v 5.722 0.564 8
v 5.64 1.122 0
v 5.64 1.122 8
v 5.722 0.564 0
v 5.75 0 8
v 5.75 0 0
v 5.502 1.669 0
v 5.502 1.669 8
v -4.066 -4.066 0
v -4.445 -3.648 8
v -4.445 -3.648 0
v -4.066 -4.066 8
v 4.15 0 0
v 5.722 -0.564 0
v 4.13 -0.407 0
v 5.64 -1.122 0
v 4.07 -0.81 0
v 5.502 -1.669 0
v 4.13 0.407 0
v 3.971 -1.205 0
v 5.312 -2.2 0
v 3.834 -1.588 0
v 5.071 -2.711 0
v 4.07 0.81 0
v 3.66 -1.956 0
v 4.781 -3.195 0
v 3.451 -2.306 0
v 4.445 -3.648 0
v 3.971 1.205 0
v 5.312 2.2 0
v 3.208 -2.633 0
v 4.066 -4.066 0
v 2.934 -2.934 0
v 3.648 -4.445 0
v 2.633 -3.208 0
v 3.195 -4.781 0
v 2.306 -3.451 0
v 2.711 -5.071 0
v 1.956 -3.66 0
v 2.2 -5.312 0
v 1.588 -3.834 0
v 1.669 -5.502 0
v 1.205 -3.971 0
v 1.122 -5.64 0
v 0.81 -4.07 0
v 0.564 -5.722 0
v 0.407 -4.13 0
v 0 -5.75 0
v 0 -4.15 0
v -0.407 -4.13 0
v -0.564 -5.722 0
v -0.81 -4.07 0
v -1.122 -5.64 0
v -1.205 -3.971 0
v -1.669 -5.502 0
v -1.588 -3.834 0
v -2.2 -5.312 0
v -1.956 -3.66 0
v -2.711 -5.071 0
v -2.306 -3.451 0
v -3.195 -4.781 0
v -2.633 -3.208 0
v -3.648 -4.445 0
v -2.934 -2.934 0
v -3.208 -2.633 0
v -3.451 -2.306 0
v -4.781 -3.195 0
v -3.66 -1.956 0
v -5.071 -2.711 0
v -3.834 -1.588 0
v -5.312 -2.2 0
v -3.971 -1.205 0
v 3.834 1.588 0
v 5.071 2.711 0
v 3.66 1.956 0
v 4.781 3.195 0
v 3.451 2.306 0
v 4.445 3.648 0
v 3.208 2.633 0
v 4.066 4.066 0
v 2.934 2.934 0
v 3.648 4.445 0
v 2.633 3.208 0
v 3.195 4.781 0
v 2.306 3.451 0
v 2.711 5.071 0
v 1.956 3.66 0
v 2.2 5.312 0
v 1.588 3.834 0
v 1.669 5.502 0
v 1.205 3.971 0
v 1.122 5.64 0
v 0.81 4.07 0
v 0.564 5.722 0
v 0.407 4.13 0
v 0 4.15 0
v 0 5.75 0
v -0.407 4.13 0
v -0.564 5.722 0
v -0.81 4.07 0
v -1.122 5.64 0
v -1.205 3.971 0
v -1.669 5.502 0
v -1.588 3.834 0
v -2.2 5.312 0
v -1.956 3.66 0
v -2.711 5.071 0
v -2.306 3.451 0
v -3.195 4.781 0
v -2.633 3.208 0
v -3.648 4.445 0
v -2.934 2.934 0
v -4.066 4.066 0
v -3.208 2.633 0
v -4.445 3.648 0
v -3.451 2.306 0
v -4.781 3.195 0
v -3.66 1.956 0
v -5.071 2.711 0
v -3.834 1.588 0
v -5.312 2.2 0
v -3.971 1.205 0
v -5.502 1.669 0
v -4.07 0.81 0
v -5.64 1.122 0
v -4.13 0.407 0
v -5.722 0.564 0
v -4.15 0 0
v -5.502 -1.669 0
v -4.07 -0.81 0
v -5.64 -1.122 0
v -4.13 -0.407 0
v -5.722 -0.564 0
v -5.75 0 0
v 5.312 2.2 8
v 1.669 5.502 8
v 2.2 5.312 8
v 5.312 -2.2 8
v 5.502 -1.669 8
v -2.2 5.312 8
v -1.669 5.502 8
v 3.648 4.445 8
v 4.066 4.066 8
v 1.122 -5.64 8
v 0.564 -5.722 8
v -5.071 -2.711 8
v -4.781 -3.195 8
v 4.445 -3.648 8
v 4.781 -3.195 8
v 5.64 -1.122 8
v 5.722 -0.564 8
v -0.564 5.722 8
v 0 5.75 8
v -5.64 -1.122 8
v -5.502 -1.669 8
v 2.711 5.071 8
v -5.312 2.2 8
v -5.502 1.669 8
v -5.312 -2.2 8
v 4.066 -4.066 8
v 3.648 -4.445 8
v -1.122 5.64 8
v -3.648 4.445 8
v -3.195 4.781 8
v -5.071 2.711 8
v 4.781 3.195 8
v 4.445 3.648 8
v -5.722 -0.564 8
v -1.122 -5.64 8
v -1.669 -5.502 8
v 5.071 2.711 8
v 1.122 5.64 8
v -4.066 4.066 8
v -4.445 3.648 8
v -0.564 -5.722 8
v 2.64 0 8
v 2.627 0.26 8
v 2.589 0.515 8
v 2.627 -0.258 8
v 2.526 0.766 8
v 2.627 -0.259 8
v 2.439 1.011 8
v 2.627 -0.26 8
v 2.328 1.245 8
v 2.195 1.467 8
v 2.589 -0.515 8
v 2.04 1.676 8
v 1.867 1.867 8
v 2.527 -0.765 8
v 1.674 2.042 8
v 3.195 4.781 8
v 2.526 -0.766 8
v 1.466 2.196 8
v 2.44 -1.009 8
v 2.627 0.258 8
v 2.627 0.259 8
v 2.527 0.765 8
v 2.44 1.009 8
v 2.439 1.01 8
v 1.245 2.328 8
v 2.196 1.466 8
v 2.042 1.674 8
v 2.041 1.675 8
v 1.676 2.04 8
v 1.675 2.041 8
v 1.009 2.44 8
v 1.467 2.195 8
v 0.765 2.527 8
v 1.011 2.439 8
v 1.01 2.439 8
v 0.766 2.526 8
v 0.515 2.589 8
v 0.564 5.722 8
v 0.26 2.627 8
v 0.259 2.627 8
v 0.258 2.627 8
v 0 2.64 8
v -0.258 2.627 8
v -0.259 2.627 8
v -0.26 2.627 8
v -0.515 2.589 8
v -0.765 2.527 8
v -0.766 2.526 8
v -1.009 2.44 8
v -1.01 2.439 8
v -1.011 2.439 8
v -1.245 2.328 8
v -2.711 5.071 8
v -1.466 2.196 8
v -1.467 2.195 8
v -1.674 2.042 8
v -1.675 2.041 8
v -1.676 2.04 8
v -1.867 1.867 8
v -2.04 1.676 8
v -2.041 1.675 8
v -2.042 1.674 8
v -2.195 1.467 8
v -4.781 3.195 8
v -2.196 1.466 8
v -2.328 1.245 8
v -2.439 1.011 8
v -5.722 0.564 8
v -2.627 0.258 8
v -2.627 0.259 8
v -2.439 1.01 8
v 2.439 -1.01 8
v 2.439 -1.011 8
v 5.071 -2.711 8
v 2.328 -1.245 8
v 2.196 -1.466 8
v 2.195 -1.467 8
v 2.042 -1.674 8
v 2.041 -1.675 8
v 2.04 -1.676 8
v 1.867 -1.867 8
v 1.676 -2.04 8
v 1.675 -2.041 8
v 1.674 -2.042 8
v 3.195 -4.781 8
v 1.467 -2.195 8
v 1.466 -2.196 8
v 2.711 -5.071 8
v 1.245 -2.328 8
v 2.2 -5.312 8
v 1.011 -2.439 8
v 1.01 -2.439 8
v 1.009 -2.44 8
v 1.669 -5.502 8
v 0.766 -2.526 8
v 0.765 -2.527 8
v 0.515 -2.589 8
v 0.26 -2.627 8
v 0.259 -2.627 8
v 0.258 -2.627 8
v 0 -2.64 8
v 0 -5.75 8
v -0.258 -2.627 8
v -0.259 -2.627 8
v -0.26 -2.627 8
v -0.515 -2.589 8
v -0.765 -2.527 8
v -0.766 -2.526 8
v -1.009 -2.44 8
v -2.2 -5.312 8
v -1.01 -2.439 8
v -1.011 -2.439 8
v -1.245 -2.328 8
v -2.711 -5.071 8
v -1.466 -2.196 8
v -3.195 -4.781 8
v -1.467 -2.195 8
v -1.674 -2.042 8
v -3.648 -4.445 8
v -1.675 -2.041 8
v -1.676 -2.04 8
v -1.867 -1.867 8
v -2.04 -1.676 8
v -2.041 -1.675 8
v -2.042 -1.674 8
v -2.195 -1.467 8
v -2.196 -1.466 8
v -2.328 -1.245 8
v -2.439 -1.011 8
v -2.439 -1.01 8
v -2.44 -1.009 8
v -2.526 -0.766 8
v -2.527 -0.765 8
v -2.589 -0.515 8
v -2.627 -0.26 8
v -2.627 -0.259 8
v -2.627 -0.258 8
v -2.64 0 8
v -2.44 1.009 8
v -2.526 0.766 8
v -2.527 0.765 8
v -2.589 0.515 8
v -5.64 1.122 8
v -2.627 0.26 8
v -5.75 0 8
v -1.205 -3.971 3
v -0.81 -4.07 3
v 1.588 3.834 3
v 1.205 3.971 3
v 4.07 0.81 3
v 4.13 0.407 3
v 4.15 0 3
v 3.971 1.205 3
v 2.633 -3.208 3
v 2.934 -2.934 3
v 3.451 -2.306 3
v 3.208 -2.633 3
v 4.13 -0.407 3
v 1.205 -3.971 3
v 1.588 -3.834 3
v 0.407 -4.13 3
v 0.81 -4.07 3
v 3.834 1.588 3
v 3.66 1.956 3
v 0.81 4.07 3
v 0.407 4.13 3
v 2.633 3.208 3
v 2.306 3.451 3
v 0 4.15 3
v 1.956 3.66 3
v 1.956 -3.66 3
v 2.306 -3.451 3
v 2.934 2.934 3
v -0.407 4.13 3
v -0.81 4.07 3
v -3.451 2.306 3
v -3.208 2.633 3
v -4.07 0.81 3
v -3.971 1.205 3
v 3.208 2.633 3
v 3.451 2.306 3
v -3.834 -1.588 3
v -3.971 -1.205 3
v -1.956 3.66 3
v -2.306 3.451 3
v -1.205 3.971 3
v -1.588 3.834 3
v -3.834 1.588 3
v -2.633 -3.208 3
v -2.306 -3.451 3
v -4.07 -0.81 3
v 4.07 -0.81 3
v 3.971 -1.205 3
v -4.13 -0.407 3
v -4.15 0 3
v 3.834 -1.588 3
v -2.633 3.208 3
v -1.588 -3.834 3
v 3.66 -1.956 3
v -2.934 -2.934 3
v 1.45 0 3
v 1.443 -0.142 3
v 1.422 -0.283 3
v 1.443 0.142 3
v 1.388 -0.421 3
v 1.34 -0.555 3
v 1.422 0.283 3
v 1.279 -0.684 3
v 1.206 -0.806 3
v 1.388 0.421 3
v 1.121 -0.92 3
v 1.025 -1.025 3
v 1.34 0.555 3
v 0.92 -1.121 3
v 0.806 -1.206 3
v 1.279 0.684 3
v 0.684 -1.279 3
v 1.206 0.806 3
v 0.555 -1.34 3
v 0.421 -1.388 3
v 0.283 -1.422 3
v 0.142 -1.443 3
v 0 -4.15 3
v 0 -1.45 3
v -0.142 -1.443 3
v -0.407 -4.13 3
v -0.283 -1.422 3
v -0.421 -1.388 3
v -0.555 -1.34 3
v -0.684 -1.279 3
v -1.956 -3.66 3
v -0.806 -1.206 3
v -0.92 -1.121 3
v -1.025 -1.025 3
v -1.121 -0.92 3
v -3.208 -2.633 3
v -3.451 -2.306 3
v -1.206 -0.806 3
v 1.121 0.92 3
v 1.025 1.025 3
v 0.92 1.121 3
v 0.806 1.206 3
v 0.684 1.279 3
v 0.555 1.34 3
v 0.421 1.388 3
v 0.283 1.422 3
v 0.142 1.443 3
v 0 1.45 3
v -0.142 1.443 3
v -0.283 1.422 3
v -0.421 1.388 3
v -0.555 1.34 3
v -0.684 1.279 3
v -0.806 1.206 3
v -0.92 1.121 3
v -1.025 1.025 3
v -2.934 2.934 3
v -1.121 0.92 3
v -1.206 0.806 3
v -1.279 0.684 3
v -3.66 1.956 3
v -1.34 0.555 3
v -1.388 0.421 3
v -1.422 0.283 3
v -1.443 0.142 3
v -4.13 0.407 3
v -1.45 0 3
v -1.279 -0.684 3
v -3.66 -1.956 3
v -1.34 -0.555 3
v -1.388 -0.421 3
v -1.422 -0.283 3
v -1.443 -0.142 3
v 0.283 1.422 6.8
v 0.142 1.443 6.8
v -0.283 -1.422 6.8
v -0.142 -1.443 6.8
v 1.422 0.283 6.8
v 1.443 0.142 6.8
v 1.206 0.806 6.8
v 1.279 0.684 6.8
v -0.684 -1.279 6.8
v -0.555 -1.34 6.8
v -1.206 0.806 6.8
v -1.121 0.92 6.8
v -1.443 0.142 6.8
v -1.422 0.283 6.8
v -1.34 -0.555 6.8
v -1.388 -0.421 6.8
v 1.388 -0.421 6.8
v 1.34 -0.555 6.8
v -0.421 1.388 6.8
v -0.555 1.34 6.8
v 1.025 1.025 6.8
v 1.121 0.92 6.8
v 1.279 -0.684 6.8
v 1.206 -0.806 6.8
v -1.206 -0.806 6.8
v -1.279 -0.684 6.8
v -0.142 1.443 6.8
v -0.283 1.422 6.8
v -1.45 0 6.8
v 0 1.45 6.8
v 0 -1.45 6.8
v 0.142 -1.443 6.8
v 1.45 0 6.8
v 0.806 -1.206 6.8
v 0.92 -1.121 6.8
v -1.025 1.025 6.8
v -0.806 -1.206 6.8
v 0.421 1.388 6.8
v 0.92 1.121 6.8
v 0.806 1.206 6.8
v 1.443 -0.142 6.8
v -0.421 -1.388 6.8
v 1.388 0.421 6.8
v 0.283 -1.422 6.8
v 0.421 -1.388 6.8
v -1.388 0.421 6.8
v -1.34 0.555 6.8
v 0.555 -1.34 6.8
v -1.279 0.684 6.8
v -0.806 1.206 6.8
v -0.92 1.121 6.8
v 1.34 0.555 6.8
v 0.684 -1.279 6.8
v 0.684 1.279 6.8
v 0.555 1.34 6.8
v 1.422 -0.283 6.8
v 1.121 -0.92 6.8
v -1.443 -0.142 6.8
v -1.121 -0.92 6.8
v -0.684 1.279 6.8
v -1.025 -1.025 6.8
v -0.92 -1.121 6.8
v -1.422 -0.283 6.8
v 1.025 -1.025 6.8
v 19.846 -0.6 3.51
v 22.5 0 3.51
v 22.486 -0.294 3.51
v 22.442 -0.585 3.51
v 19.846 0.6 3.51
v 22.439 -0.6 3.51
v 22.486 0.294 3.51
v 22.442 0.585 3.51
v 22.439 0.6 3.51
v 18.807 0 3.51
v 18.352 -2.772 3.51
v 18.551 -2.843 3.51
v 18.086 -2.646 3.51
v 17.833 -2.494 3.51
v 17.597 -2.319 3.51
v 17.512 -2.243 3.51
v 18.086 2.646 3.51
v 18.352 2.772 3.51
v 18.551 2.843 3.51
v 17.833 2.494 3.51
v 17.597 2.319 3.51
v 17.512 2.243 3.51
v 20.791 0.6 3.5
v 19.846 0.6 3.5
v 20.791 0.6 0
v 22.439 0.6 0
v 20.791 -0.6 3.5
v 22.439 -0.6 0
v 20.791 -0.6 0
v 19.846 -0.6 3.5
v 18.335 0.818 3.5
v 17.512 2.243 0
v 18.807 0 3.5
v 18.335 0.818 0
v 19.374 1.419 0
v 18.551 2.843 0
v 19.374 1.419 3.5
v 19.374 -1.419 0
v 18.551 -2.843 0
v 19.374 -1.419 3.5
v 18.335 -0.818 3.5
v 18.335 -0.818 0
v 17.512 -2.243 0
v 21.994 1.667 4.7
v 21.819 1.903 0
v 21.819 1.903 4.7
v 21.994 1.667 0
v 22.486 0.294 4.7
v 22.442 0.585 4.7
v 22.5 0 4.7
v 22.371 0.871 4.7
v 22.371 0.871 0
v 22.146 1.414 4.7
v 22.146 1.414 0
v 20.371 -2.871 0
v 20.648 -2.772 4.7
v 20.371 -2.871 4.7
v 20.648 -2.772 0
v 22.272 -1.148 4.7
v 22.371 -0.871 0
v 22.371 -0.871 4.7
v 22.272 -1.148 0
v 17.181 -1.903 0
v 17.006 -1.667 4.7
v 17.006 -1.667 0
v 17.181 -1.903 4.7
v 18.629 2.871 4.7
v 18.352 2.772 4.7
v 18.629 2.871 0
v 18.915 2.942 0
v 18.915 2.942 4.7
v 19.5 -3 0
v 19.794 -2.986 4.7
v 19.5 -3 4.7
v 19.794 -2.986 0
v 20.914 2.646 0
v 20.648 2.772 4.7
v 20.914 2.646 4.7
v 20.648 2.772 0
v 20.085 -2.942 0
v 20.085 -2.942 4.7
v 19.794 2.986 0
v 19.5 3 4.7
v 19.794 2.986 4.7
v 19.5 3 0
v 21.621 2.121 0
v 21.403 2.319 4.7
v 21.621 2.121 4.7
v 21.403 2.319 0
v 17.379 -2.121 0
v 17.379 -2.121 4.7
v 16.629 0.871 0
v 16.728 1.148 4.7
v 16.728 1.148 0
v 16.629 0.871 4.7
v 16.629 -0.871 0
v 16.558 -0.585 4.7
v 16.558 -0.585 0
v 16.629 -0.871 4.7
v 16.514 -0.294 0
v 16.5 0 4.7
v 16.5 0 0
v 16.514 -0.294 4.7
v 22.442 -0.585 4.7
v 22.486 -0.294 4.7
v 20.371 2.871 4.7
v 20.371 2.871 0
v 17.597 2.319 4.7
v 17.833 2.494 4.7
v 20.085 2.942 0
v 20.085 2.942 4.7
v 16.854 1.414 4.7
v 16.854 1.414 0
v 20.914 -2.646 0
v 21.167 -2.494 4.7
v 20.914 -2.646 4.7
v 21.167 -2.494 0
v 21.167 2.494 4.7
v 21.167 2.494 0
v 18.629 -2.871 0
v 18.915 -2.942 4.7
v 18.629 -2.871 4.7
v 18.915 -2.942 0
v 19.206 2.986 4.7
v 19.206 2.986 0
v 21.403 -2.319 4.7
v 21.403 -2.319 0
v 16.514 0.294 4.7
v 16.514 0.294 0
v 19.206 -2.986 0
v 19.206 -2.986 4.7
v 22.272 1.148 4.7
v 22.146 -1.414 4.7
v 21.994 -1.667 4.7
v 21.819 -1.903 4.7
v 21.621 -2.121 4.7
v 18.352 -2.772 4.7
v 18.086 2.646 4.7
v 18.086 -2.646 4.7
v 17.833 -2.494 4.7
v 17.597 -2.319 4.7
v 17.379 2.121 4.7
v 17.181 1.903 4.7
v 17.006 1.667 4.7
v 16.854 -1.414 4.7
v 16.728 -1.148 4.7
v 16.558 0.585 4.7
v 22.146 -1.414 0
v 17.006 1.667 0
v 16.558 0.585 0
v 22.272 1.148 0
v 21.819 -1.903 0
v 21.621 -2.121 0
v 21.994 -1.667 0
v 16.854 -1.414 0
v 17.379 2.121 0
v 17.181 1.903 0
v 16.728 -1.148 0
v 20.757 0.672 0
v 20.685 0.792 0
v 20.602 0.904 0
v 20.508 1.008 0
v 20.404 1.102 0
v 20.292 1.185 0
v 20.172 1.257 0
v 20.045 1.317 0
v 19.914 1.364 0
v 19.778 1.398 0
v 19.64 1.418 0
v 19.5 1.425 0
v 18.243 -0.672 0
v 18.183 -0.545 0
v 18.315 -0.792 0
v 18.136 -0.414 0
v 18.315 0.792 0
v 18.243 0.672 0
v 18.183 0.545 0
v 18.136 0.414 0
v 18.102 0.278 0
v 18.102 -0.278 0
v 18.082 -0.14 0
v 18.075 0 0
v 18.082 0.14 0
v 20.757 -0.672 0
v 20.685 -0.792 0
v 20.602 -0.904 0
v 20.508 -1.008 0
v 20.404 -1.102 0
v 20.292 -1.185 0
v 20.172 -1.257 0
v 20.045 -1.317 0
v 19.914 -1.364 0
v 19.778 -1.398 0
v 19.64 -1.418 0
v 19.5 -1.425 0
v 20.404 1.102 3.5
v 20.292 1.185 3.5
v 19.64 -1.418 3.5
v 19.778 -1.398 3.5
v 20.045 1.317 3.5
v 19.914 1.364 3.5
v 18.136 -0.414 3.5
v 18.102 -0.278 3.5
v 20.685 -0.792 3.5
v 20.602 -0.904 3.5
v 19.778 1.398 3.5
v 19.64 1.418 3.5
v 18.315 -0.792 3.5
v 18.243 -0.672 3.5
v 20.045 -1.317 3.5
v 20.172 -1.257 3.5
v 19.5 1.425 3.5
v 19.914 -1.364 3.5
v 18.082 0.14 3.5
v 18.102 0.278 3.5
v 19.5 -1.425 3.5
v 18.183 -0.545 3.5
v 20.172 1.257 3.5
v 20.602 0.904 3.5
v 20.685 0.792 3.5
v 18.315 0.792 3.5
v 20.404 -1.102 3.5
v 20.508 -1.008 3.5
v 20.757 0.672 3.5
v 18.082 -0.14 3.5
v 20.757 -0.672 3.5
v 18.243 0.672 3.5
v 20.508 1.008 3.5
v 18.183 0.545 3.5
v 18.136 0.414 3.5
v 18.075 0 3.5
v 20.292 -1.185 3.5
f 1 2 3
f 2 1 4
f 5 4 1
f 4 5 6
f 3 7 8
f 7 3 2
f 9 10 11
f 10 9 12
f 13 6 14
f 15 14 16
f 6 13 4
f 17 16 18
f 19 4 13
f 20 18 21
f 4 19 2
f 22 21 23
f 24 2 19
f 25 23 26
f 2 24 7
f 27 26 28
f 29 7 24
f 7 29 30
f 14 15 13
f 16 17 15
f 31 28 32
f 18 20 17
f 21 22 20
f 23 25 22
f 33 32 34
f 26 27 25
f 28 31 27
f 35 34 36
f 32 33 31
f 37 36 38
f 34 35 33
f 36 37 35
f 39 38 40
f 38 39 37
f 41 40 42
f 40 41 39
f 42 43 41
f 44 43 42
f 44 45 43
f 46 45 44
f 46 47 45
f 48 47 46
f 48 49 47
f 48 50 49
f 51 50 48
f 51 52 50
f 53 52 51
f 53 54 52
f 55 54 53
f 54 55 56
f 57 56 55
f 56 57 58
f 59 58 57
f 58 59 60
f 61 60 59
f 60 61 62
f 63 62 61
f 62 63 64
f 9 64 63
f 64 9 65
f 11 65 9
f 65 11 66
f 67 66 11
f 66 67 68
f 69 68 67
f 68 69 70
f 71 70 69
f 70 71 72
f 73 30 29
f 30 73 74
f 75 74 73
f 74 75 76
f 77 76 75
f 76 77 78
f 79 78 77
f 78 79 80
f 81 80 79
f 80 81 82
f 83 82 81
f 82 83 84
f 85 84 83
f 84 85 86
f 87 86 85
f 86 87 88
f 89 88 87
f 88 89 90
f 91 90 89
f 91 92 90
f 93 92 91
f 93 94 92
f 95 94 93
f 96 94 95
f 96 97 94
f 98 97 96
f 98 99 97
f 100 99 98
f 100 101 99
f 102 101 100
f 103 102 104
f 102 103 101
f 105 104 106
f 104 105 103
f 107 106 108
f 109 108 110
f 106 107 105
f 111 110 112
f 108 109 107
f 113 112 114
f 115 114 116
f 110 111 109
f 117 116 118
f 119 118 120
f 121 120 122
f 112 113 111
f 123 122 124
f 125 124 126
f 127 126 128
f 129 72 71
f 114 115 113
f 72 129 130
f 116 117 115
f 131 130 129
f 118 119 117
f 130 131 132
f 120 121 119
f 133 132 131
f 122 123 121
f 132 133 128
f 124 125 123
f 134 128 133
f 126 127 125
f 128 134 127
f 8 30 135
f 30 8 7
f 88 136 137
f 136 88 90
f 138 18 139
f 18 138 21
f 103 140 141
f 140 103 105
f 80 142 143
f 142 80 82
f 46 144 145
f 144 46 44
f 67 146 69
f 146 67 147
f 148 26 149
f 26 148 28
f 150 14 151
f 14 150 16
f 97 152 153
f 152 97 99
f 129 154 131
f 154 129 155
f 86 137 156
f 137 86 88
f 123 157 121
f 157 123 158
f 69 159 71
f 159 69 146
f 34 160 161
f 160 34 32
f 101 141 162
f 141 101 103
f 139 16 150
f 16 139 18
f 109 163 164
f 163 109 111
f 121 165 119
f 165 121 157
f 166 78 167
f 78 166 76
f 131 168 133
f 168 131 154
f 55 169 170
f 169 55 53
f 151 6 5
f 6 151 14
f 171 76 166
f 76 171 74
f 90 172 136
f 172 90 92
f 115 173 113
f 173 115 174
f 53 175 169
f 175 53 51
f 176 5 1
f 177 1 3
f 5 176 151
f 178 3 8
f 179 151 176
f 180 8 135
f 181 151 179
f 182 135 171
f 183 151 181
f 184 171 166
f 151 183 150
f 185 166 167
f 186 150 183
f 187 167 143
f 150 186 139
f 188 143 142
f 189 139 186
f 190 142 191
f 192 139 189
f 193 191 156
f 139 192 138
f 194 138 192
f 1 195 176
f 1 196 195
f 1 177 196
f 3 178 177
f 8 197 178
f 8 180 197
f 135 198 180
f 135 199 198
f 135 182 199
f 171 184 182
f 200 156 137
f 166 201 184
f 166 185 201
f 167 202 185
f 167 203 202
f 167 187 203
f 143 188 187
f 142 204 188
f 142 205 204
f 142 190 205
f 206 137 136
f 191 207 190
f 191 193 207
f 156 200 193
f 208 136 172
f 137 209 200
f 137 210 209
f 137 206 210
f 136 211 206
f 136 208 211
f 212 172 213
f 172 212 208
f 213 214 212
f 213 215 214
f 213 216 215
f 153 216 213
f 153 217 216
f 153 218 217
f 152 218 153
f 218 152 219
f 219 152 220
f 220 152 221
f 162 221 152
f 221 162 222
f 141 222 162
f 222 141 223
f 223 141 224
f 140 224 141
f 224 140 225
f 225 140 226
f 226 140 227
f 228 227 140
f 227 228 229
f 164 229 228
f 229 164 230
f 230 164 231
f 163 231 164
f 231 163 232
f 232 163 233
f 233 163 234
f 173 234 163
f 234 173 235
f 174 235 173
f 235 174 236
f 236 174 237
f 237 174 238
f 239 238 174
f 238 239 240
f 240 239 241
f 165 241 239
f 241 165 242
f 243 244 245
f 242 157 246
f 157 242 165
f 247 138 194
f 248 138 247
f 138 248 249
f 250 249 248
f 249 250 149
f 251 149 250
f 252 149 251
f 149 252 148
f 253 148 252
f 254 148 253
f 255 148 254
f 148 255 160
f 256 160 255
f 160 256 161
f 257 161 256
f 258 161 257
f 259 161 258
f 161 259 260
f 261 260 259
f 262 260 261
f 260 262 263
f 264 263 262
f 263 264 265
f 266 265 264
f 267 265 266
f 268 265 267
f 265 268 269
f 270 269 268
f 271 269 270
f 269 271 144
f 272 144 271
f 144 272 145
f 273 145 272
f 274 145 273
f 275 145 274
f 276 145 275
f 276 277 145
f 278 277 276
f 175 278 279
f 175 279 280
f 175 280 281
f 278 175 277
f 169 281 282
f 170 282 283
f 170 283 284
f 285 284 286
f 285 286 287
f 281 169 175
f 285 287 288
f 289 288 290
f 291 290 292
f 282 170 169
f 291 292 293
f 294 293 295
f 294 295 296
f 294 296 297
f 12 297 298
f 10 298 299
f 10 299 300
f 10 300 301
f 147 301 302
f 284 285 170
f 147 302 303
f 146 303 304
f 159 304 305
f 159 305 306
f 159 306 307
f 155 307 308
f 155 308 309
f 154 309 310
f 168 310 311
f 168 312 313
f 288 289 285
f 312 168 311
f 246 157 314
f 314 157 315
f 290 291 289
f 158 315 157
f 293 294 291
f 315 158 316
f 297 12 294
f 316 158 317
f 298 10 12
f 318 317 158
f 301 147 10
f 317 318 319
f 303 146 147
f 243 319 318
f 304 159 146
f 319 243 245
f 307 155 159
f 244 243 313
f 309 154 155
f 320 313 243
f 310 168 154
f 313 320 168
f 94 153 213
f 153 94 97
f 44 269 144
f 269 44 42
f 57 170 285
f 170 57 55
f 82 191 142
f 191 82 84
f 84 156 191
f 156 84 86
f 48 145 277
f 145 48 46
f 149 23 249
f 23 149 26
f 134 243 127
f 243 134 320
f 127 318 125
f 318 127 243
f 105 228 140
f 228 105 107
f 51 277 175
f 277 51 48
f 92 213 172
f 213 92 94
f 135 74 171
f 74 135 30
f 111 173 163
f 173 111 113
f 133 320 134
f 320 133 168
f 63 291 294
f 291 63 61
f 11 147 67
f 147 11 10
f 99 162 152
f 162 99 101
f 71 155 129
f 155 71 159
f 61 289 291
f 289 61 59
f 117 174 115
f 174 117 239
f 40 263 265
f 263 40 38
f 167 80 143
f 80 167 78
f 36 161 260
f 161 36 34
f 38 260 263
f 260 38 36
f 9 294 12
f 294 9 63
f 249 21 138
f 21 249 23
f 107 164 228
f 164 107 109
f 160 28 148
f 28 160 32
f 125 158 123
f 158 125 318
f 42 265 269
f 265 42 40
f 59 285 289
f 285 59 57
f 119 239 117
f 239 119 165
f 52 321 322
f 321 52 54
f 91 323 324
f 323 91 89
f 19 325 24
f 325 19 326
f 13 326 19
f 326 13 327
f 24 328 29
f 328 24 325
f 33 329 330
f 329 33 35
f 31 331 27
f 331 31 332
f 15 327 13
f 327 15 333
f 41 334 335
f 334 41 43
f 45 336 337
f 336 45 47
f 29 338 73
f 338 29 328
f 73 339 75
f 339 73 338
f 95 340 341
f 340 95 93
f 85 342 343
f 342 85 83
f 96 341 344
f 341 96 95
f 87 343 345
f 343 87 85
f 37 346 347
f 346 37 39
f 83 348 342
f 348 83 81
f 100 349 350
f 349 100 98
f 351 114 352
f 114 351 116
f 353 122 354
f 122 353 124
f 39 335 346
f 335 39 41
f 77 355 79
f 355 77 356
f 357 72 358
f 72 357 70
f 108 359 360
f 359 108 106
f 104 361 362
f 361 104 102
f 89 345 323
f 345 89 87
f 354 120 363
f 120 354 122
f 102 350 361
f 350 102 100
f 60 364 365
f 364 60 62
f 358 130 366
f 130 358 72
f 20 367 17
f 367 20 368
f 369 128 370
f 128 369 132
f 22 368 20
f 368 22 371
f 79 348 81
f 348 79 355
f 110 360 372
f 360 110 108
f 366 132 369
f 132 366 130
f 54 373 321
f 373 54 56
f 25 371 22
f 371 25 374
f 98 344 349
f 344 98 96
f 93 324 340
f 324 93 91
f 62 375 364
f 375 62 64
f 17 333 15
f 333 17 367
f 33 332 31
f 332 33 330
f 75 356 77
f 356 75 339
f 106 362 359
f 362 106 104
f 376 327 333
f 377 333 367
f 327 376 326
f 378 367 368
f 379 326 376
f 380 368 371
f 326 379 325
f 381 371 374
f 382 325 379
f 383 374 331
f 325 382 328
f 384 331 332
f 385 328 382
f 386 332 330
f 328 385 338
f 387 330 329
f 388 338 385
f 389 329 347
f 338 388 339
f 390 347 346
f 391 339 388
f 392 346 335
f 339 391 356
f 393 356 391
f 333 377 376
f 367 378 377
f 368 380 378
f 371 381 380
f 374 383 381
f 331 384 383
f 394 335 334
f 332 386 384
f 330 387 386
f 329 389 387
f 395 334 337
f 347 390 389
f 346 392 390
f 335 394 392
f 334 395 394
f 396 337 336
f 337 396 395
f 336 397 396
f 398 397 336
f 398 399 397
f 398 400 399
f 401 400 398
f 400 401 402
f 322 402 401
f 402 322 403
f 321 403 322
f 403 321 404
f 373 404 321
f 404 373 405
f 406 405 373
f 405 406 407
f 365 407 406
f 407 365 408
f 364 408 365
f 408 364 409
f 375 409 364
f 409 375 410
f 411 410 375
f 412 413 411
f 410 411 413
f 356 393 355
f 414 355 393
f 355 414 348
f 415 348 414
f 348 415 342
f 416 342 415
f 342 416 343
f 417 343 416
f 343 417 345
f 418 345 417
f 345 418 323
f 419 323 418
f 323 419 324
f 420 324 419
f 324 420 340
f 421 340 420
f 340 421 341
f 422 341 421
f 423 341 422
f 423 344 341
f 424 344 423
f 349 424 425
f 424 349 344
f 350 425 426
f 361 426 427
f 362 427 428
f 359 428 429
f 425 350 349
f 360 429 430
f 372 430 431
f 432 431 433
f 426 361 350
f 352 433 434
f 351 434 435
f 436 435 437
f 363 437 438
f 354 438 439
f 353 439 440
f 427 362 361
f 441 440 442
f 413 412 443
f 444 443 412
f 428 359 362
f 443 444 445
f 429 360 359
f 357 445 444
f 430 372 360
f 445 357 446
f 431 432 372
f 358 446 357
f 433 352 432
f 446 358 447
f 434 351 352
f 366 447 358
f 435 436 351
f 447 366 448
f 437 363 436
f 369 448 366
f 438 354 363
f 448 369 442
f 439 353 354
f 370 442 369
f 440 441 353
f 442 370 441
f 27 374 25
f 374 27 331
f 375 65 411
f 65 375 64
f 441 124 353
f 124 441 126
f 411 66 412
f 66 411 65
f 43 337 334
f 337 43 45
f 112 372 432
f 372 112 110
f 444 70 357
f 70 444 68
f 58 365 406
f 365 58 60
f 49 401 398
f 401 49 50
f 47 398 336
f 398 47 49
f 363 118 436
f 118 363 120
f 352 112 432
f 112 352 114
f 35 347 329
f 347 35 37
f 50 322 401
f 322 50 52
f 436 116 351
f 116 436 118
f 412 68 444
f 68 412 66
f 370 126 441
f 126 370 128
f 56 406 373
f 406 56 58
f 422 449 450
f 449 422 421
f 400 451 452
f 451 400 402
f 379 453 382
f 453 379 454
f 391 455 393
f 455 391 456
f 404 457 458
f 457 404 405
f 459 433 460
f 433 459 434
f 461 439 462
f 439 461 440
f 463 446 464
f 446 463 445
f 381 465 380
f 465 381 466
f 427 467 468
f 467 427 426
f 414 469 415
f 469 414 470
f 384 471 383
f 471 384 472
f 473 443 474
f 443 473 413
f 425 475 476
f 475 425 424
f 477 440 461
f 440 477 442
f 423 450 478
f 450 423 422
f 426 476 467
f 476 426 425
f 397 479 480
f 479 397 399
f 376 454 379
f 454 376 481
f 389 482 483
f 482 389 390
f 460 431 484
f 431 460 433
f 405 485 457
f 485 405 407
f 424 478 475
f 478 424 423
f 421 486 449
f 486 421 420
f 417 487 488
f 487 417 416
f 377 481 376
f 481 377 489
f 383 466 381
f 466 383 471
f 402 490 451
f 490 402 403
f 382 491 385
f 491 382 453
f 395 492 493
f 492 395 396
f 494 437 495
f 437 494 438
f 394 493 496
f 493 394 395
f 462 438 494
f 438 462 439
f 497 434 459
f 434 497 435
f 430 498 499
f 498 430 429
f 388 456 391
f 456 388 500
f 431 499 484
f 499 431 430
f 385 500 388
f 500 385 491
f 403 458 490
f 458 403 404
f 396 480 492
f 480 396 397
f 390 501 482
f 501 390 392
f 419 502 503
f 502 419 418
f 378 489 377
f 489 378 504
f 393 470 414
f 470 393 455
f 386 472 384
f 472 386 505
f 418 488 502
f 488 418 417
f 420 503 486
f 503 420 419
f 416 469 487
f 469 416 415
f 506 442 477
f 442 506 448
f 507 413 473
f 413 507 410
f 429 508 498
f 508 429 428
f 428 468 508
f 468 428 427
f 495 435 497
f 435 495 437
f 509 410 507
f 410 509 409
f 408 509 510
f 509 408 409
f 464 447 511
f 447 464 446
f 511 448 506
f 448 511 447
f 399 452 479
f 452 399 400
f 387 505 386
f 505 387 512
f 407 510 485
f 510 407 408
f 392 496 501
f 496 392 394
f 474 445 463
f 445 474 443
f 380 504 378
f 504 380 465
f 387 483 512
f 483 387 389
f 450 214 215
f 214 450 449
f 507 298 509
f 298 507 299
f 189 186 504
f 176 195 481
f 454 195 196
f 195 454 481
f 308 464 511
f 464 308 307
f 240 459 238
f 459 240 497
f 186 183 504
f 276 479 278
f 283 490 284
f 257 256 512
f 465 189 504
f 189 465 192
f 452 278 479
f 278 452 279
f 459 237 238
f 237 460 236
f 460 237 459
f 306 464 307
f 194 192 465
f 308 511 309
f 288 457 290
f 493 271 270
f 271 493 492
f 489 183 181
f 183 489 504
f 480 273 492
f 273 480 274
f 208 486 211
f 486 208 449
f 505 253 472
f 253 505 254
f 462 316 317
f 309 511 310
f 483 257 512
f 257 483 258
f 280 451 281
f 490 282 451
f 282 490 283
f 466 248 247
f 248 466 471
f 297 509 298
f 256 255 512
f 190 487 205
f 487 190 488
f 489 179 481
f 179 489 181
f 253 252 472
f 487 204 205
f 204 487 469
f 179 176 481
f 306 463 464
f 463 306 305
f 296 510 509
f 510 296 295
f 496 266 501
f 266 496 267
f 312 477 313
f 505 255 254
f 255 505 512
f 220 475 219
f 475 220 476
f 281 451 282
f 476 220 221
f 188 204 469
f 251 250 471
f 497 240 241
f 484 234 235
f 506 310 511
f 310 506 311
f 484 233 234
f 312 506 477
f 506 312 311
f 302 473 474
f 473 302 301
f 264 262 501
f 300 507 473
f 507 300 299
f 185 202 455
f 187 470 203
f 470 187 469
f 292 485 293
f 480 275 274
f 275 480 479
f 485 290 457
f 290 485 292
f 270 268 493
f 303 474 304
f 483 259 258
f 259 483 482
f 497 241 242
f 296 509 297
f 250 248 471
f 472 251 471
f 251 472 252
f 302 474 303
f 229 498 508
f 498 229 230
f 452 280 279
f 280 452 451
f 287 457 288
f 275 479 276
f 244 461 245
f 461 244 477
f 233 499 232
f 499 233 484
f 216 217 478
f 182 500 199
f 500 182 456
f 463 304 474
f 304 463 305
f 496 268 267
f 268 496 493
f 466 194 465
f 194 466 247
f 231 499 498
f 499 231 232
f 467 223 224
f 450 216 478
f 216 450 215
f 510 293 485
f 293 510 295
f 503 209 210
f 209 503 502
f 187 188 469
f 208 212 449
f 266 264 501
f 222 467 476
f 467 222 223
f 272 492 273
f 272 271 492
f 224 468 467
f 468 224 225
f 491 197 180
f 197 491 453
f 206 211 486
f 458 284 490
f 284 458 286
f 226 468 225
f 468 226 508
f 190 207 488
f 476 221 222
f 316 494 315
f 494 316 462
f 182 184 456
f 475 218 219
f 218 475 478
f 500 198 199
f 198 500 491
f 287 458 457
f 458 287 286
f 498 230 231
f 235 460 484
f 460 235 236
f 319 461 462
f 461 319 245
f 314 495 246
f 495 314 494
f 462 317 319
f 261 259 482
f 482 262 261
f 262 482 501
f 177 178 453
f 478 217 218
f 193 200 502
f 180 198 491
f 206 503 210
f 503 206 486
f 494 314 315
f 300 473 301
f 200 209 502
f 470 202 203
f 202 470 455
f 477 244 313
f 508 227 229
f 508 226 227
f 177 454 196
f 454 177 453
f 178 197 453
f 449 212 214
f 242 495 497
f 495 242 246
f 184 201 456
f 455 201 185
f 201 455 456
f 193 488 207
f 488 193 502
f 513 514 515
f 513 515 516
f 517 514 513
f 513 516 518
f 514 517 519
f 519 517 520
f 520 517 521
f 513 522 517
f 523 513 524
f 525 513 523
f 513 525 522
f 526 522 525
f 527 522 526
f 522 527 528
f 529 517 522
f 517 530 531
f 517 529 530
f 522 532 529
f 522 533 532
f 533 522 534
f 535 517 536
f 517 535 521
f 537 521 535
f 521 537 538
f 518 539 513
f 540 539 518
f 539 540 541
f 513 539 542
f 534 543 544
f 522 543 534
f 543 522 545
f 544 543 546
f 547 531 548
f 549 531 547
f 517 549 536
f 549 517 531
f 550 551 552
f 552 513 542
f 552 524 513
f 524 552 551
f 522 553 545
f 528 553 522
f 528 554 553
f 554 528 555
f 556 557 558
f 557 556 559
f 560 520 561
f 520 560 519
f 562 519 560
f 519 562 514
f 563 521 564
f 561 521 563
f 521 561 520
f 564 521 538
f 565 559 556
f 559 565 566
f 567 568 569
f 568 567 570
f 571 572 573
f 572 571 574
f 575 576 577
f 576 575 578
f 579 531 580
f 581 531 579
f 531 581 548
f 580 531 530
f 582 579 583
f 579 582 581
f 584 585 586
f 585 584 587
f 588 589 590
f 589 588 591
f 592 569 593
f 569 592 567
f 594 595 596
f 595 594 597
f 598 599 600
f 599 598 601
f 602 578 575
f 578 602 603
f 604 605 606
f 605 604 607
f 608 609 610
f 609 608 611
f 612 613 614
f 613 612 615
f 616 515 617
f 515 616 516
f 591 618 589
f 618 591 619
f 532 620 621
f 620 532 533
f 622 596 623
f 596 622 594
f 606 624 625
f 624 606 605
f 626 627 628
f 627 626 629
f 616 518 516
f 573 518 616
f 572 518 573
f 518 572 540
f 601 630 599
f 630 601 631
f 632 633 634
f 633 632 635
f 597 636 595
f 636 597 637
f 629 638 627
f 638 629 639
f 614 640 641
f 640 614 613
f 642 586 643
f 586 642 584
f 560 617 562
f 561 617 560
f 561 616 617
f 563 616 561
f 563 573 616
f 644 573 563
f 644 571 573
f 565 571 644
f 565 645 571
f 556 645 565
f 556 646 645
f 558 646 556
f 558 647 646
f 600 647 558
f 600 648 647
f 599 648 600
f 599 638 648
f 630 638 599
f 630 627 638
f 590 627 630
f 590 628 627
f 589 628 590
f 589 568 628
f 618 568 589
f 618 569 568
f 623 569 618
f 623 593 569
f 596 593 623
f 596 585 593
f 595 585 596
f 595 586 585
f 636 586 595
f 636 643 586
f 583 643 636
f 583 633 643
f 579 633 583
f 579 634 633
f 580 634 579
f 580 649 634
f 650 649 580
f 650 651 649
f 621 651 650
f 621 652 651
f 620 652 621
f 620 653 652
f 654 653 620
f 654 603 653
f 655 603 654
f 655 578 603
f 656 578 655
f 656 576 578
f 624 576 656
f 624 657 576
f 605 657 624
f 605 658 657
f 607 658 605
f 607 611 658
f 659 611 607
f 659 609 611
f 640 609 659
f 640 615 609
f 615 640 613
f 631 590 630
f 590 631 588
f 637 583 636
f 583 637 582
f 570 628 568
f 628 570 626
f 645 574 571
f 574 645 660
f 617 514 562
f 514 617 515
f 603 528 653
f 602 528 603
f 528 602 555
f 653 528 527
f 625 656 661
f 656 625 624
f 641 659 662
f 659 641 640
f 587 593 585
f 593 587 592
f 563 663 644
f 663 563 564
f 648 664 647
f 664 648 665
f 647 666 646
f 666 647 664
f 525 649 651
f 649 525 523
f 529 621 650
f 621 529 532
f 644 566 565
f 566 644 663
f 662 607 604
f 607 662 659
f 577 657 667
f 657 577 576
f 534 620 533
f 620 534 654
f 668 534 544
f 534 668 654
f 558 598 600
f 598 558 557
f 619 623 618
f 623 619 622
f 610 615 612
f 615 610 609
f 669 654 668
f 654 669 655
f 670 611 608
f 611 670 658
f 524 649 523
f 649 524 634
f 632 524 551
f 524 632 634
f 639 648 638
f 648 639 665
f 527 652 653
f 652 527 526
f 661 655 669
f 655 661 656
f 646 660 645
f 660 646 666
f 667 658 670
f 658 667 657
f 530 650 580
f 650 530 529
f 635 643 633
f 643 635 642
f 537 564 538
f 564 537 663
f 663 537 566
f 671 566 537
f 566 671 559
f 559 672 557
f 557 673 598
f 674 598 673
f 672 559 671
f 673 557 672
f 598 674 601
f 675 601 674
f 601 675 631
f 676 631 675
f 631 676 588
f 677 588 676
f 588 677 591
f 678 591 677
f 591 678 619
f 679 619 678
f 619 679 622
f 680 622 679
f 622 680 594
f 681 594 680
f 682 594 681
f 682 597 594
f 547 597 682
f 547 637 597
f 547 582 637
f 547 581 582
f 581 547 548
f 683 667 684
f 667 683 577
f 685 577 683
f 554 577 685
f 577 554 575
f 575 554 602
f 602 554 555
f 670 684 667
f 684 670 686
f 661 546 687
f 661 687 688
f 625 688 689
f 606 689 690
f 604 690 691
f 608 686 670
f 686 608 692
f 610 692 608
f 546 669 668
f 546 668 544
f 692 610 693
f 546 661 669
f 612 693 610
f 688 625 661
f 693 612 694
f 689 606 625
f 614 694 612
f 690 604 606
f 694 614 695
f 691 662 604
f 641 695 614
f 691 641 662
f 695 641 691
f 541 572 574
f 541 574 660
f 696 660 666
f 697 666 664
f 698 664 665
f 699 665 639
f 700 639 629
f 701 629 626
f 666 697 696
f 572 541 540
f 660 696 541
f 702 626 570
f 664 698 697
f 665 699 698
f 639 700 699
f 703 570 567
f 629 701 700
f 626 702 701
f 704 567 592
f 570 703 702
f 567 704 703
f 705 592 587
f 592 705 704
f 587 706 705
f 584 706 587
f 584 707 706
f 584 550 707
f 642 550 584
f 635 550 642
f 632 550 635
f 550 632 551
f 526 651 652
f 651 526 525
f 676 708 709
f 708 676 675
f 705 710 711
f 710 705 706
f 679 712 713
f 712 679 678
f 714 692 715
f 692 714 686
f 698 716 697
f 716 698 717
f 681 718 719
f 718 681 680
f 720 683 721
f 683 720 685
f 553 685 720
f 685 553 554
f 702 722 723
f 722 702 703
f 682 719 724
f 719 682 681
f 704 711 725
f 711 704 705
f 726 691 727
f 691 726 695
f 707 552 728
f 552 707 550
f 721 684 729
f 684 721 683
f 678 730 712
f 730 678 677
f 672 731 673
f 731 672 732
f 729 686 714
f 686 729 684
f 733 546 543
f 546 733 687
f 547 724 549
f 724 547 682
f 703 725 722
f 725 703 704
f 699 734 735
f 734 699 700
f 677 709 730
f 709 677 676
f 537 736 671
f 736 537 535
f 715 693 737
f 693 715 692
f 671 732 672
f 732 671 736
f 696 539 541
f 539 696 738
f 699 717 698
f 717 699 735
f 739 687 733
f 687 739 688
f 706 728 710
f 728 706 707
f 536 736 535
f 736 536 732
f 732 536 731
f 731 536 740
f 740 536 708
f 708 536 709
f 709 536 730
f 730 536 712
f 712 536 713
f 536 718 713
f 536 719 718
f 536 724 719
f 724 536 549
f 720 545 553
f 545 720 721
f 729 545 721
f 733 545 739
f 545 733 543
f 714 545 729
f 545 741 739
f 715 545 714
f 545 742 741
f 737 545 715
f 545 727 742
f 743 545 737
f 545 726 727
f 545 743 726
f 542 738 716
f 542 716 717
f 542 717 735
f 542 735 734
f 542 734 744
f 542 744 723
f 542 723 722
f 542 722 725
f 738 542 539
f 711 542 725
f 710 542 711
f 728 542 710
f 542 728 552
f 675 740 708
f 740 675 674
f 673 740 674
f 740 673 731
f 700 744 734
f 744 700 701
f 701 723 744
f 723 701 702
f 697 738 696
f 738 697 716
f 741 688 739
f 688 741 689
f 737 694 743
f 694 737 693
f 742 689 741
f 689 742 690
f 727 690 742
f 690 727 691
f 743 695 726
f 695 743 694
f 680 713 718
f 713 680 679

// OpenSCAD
// =====================================================================
// gravity_gimbal.scad — the self-righting pivot ("pieces turn by gravity")
// =====================================================================
//
// This is the mechanism that makes a piece stay upright no matter how the
// board is rotated. There are THREE architectures for it and this file
// builds all of them; `pivot_type` in common.scad picks one. The first two
// differ in WHERE THE MAGNET LIVES, and that single choice decides
// everything else; the third keeps the magnet on the board and changes WHAT
// THE PIECE TURNS ON.
//
// ---------------------------------------------------------------------
// pivot_type = "pin"  — the magnet is on the BOARD side.
//   PER PIECE: 3 PRINTED (piece body, hub puck, press cap)
//            + 2 BOUGHT  (Ø8 x 3 magnet, Ø3 x 16 steel dowel)
//            = 5 components, plus a felt disc over the magnet.
// ---------------------------------------------------------------------
//   1) HUB PUCK  — a Ø11.5 x 8 PRINTED disc with a neodymium magnet press-fit
//                  in its back (grips the steel-backed board) and a bore in
//                  its front for the AXLE DOWEL. Slides to any square and
//                  rotates WITH the board when the board flips.
//                  DELIBERATELY SMALL: at Ø22 it was a grey collar showing
//                  behind every piece. Ø11.5 is what a piece's own waist can
//                  hide (see square_size in common.scad), and it is not
//                  marginal structurally — a 3 g piece hanging 11 mm proud
//                  tips it with ~0.0003 N.m against the magnet's ~0.03 N.m.
//   2) AXLE      — a stock Ø3 x 16 mm STEEL DOWEL PIN, BOUGHT not printed,
//                  pressed in until it bottoms on the magnet. Ground steel
//                  roughly halves the sliding friction against the piece's
//                  bore, and friction is what decides how straight a piece
//                  settles; a Ø3 steel dowel also takes a 20 N sideways knock
//                  with 3.0x margin where the Ø4 PRINTED post it replaced had
//                  only 1.29x. Thinner AND stronger.
//   3) BODY       — the silhouette plate, with a Ø3.70 bore through it
//                  (pieces.scad subtracts body_pivot_cut()). The bore is a
//                  HOLE, not a part: it spins freely on the dowel.
//   4) PRESS CAP — a Ø6 PRINTED cap gripping the dowel tip by interference so
//                  the body cannot fall off while still spinning. Three slits
//                  let its fingers spread. The one part of the mechanism that
//                  faces the room: Ø8 read as a deliberate button, Ø6
//                  disappears into the waist.
//   THE STACK, front to back:  cap (4.7) | piece (6) | hub (8) | magnet.
//   The dowel stands axle_len = 11 proud and piece + cap grip = 9.5, so there
//   is 1.5 mm of AXIAL FLOAT by design — without it, tolerance stacking could
//   clamp the piece between cap and hub and stall the rotation.
//   THE POINT OF THIS ARCHITECTURE: the magnet's mass is on the BOARD, so it
//   never enters the pendulum at all.
//
// ---------------------------------------------------------------------
// pivot_type = "magnet" — the magnet is IN THE PIECE.
//   PER PIECE: 1 PRINTED (the body)
//            + 2 BOUGHT  (Ø4 x 5 magnet, Ø9 x 0.8 steel disc)
//            = 3 components, and no felt disc.
// ---------------------------------------------------------------------
//   NO hub puck, NO dowel, NO cap — three named parts go away and one arrives
//   (the retaining disc), so the NET saving is TWO components. Where it really
//   lands is printing: PRINTED parts per piece go 3 -> 1, and there is nothing
//   to print but the piece itself.
//   1) MAGNET    — a BOUGHT Ø4 x 5 neodymium disc dropped into the piece's own
//                  bore from the BACK, flush with the back face, gripping the
//                  steel sheet directly. THE PIECE TURNS ON THE MAGNET: the
//                  magnet is the journal.
//   2) RETAINING — a BOUGHT Ø9 x 0.8 steel disc, held on the magnet's front
//      DISC        pole by that same magnet with NO GLUE, recessed into a
//                  1.0 mm counterbore in the piece's FRONT face. Being wider
//                  than the bore it cannot pass through it, so it is what
//                  stops the piece pulling off the magnet.
//
//   WHAT IT COSTS, measured rather than assumed (see the tables in the
//   piece_style/pivot_type comments in common.scad):
//     * r grows. In sin(lean) = mu*r/d, r is now the Ø4.70 magnet bore's
//       radius (2.35) instead of the Ø3.70 pin bore's (1.85).
//     * d shrinks. The magnet AND the disc ride WITH the piece, sitting
//       exactly on the pivot at ZERO lever arm, so they drag the combined
//       centre of mass toward the axis. Mass cancels for a single rigid
//       piece — but mass added AT the pivot does not, and this is exactly
//       that case.
//   Together: roughly +0.4 to +0.6 deg of lean, for two fewer components per
//   piece — and two fewer PRINTED ones, which is the saving that matters.
//
//   TWO THINGS ABOUT THIS ARCHITECTURE ARE UNPROVEN, and neither is in the
//   lean numbers:
//     * nothing has verified that a Ø9 steel disc actually STAYS PUT on a
//       Ø4 magnet through a board flip;
//     * the disc bears on the counterbore floor and presses the piece's whole
//       back face onto the steel sheet with the magnet's full pull, so
//       rotation has to overcome FACE friction at silhouette radii, not just
//       bore friction at r = 2.35. The lean figures model bore friction only
//       and are therefore OPTIMISTIC for this architecture. Under "pin" the
//       piece bears on the hub puck's Ø11.5 face under its own weight only,
//       which is why the same objection does not apply there.
//   pivot_test_coupon() below is the cheap part that settles both.
//
// ---------------------------------------------------------------------
// pivot_type = "bearing" — "pin", with the sliding bore replaced by a
//                          bought ball bearing.
//   PER PIECE: 3 PRINTED (piece body, hub puck, press cap)
//            + 3 BOUGHT  (Ø8 x 3 magnet, Ø3 x 16 steel dowel, MR63ZZ bearing)
//            = 6 components, plus a felt disc.
// ---------------------------------------------------------------------
//   Everything board-side is IDENTICAL to "pin" -- same hub puck, same
//   magnet, same dowel, same press cap, same 1.5 mm axial float. The one
//   change is in the piece: instead of a Ø3.70 plain bore sliding on the
//   dowel, an MR63ZZ deep-groove bearing (Ø3 bore x Ø6 OD x 2.5 wide)
//   presses into a seat in the piece's BACK face, and a LOOSE Ø5 bore runs
//   through the 3.5 mm of plate in front of it so nothing but the bearing
//   ever touches the dowel. The bearing's inner ring is a slip fit on the
//   dowel; rolling resistance is so far below any sliding interface that
//   rotation goes through the balls.
//
//   WHAT IT BUYS: the parking error stops depending on mu. Rolling
//   friction is of order mu ~ 0.002, so sin(lean) = mu*r/d parks every
//   piece within a few hundredths of a degree NO MATTER what Phase 0
//   measures for the greased bore. This is the fallback architecture if
//   the ten-flip test comes back far above the assumed 0.08.
//
//   WHAT IT COSTS, stated plainly:
//     * ~0.5 g of steel at exactly zero lever arm. Same objection as the
//       "magnet" architecture's disc: it shrinks d. With mu ~ 0.002 the
//       parking error stays ~0 anyway, so this costs settle TIME, not
//       parking angle.
//     * a bearing to buy per piece -- 32 of them, the priciest bought part
//       in any architecture here.
//     * THE REAL ONE: nothing damps the pendulum any more. On the greased
//       pin, the grease is simultaneously the parking error AND the damper;
//       take it away and a piece excited by a board flip keeps swinging --
//       a near-frictionless pendulum rings for a long time, and while it
//       rings the familiar style's sweep margins (1.25 mm, worst legal
//       pair) do not hold. UNMEASURED how long: the ZZ shields' factory
//       grease fill gives some drag, and the Phase-0 flip test measures
//       ring-down time as its first question for this architecture.
//       Retrofit dampers if it rings too long, in order of preference:
//       a smear of damping grease between piece back and hub face (near-
//       zero normal force there, so it shears viscously -- tune amount on
//       the real part), or an eddy-current damper (conductive disc on the
//       piece, off-axis magnets in the hub) -- which does NOT fit in the
//       Ø11.5 puck; it needs ~Ø15, which only the familiar style's waists
//       can hide. Neither is modelled; both are recorded so the flip test
//       knows what it is deciding between.
//
// ---------------------------------------------------------------------
// Print the hub and cap in any material; PETG is a good tough choice.
//
// FRICTION IS THE TUNING KNOB, and it cuts both ways. Too much and the piece
// parks off-vertical. Too little and nothing damps the swing — a piece on a
// bare ball bearing would ring for minutes after every board flip. Use a
// SILICONE DAMPING GREASE: viscous, so it kills the ringing, without adding
// the static friction that creates the off-vertical error in the first place.
// The modelled lean figures assume mu = 0.08 (greased steel on plastic),
// which is a TEXTBOOK number, not a measured one — and NOTHING here has been
// printed yet. Printing one pawn and one hub is the cheapest way to settle
// it, and it is the test to do first.
// =====================================================================

include <common.scad>

// =====================================================================
// SHARED — what the piece body needs from the pivot, either architecture.
// pieces.scad calls these and never repeats the arithmetic itself.
// =====================================================================

// The bore the piece turns in. Under "pin"/"magnet" this is `r` (halved) in
// sin(lean) = mu*r/d. Under "bearing" it is the OUTER-RACE SEAT — the widest
// cut at the pivot, which is what the cavity guard in pieces.scad needs; the
// lean equation loses its meaning there because the balls roll instead of
// the bore sliding.
function pivot_bore_dia() =
      pivot_type == "pin"     ? axle_dia + 2*axle_fit             // 3.70
    : pivot_type == "magnet"  ? pivot_magnet_dia + 2*axle_fit     // 4.70
    : pivot_type == "bearing" ? pivot_bearing_od + 2*pivot_bearing_seat_fit   // 6.10
    : assert(false, str("gravity_gimbal.scad: unknown pivot_type \"", pivot_type, "\"")) 0;

// Diameter of the seat that receives the retaining disc ("magnet" only).
function disc_seat_dia() = retain_disc_dia + 2*disc_seat_slop;

// The circle the lightening cavity must leave standing around the pivot, so
// the bore keeps a full wall whichever architecture is selected. pieces.scad
// subtracts this from its cavity outline; the arithmetic lives HERE, with the
// rest of the pivot keep-out, rather than half here and half inline there.
function pivot_cavity_guard_dia() = pivot_bore_dia() + 2*hollow_wall;

// Everything subtracted from a piece body at the pivot. Piece coordinates:
// pivot on the origin, FRONT face at z = 0, BACK face at z = piece_thk.
module body_pivot_cut() {
    // The through-bore. Under "bearing" the full-diameter cut is only the
    // seat (below); what runs through the plate in front of it is a LOOSE
    // clearance bore, so the plate itself never touches the dowel.
    translate([0, 0, -0.5])
        cylinder(d = pivot_type == "bearing" ? pivot_bearing_clear_dia
                                             : pivot_bore_dia(),
                 h = piece_thk + 1);
    if (pivot_type == "magnet")
        // Seat for the steel retaining disc, in the FRONT face. 1.0 deep for
        // a 0.8 disc, so the disc sits 0.2 below flush and never rubs the
        // player's fingers before the piece does.
        translate([0, 0, -0.5])
            cylinder(d = disc_seat_dia(), h = disc_seat_depth + 0.5);
    if (pivot_type == "bearing")
        // Seat for the bearing's outer race, opening on the BACK face — the
        // face-down print orientation leaves it pointing up, so it prints
        // clean and the bearing presses in after printing.
        translate([0, 0, piece_thk - pivot_bearing_w])
            cylinder(d = pivot_bore_dia(), h = pivot_bearing_w + 0.5);
}

// Solid that the lightening cavity must NOT eat into, BEYOND the guard circle
// above. Under "pin" that circle is the whole story, so this is empty. Under
// "bearing" it is empty for the same reason: pivot_bore_dia() reports the
// seat — the widest cut — so pivot_cavity_guard_dia() already keeps a full
// hollow_wall around both the seat and the clearance bore.
// Under "magnet" the disc seat is 1.0 deep and the cavity starts at
// hollow_wall = 0.9, so without this the seat would open straight into the
// cavity above the pivot and the disc would be left bearing on half a floor.
// It is a local collar, not a thicker front wall: it adds solid only within
// Ø(seat + 2 walls) of the axis, where the lever arm is ~0, so it costs
// almost nothing in `d`.
module pivot_cavity_keepout() {
    if (pivot_type == "magnet")
        translate([0, 0, -0.5])
            cylinder(d = disc_seat_dia() + 2*hollow_wall,
                     h = disc_seat_depth + hollow_wall + 0.5);
}

// =====================================================================
// PIVOT "pin" — the printed parts.
// =====================================================================

// ---- Hub puck: magnet in the back, dowel bore in the front -----------
// The puck prints flat with no post and no supports. The Ø3 steel dowel is
// pressed in afterwards; it bottoms out on the back of the magnet, so the
// two cavities meet in the middle (magnet_thk 3 + axle_embed 5 = hub_thk 8)
// and there is no thin printed web between them to crack.
module hub_puck() {
    difference() {
        cylinder(d = hub_dia, h = hub_thk);
        // Magnet cavity opening on the BACK (wall-facing) face. Ø8.3 in an
        // Ø11.5 puck leaves a 1.6 mm wall all round the magnet.
        translate([0, 0, -0.01])
            cylinder(d = magnet_dia + 2*magnet_fit, h = magnet_thk + 0.01);
        // Dowel bore from the FRONT face, interference fit. Ends exactly on
        // the magnet, which is what the dowel bottoms out against.
        translate([0, 0, hub_thk - axle_embed])
            cylinder(d = axle_dia + axle_press_fit, h = axle_embed + 0.01);
        // Chamfer at the bore mouth so the dowel starts square when pressed.
        // It is cut INTO this face, so nothing protrudes and the piece needs
        // no matching countersink.
        translate([0, 0, hub_thk - axle_root_fillet])
            cylinder(d1 = axle_dia + axle_press_fit,
                     d2 = axle_dia + axle_press_fit + 2*axle_root_fillet,
                     h  = axle_root_fillet + 0.01);
    }
}

// (There is no module for the dowel itself: it is BOUGHT, stock Ø3 x 16 mm,
// and nothing in this repo renders an assembly preview to draw it into.)

// ---- Press cap: retains the body on the dowel but lets it spin --------
// A steel dowel has no lip to snap behind, so the cap grips the plain shaft
// by interference instead: an undersize bore split into three fingers by the
// slits, which spread as it is pushed on. Closed back hides the dowel tip.
// Pulls off with firm finger pressure for servicing.
// It only has to resist knocks — on a vertical board gravity pulls the piece
// DOWN the silhouette, not OFF the axle.
module press_cap() {
    // DERIVED, not chosen: axial_float is the design intent (common.scad) and
    // the grip zone is simply what is left of the proud dowel once the piece
    // and that float are taken out -- 11 - 6 - 1.5 = 3.5. Written this way
    // because the three numbers CO-DEFINE the float: tuning this one on its own
    // would silently spend the float, and the first symptom is a piece clamped
    // between cap and hub that will not turn.
    grip = axle_len - piece_thk - axial_float;
    back = 1.2;    // solid closed back over the dowel tip
    slit = 1.2;    // slit width. Ø6 cap over a Ø2.85 bore leaves a 1.58 mm
                   //   finger wall, so a 1.2 slit still prints as three
                   //   distinct fingers on a 0.4 mm nozzle.
    difference() {
        cylinder(d = cap_dia, h = grip + back);
        // Grip bore: interference on the plain dowel (cap_grip_fit < 0).
        translate([0, 0, -0.01])
            cylinder(d = axle_dia + cap_grip_fit, h = grip + 0.01);
        // Three radial slits so the fingers can spread over the dowel.
        for (a = [0, 120, 240])
            rotate([0, 0, a])
                translate([cap_dia/2, 0, grip/2])
                    cube([cap_dia, slit, grip + 0.02], center = true);
    }
}

// Hub + cap side by side: print one pair, verify the magnet press-fit and
// that the cap snaps on and still spins.
module gimbal_testprint() {
    hub_puck();
    translate([hub_dia + 8, 0, 0]) press_cap();
}

// =====================================================================
// PIVOT "magnet" — there are NO printed pivot parts.
// The magnet and the retaining disc are both bought. The only printed
// geometry is the bore and counterbore, and those live in the piece itself
// (body_pivot_cut above), so there is nothing here to export as a part.
// What IS worth printing is a coupon carrying exactly that geometry and
// nothing else, because it is what settles the two unproven claims in the
// header: press a Ø4 magnet in, stick the Ø9 disc on, put it on the steel
// sheet, and flip it. If the disc walks off, or if the coupon will not turn
// under a fingertip because its back face is clamped to the sheet, this
// architecture is answered for the cost of one 2 g print.
// =====================================================================
// Rim left outside the disc seat's own wall, purely so the coupon can be held
// between finger and thumb while it is turned against the sheet. It is the one
// number here that answers to a hand rather than to the mechanism, which is why
// it is a literal -- but the rest of the disc is not: the coupon has to carry
// the seat AND the seat's wall at full size or it is not testing the geometry
// it exists to test.
coupon_rim = 2.3;      // -> Ø9.6 seat + 2x0.9 wall + 2x2.3 = Ø16, as the docs quote

module pivot_test_coupon() {
    difference() {
        cylinder(d = disc_seat_dia() + 2*hollow_wall + 2*coupon_rim, h = piece_thk);
        body_pivot_cut();
    }
}

// (The magnet and the retaining disc are BOUGHT and there is no assembly
// preview in this repo, so neither has a module here.)

// ---- Render dispatch --------------------------------------------------
// Under "magnet" the hub and the cap are not part of the design at all, so
// they are not exported: the file renders the coupon instead. Under
// "bearing" the printed pivot parts are exactly the "pin" ones — the bearing
// itself is bought — so it renders the same test pair.
if (pivot_type == "pin") gimbal_testprint();
else if (pivot_type == "bearing") gimbal_testprint();
else if (pivot_type == "magnet") pivot_test_coupon();
else assert(false, str("gravity_gimbal.scad: unknown pivot_type \"", pivot_type, "\""));
